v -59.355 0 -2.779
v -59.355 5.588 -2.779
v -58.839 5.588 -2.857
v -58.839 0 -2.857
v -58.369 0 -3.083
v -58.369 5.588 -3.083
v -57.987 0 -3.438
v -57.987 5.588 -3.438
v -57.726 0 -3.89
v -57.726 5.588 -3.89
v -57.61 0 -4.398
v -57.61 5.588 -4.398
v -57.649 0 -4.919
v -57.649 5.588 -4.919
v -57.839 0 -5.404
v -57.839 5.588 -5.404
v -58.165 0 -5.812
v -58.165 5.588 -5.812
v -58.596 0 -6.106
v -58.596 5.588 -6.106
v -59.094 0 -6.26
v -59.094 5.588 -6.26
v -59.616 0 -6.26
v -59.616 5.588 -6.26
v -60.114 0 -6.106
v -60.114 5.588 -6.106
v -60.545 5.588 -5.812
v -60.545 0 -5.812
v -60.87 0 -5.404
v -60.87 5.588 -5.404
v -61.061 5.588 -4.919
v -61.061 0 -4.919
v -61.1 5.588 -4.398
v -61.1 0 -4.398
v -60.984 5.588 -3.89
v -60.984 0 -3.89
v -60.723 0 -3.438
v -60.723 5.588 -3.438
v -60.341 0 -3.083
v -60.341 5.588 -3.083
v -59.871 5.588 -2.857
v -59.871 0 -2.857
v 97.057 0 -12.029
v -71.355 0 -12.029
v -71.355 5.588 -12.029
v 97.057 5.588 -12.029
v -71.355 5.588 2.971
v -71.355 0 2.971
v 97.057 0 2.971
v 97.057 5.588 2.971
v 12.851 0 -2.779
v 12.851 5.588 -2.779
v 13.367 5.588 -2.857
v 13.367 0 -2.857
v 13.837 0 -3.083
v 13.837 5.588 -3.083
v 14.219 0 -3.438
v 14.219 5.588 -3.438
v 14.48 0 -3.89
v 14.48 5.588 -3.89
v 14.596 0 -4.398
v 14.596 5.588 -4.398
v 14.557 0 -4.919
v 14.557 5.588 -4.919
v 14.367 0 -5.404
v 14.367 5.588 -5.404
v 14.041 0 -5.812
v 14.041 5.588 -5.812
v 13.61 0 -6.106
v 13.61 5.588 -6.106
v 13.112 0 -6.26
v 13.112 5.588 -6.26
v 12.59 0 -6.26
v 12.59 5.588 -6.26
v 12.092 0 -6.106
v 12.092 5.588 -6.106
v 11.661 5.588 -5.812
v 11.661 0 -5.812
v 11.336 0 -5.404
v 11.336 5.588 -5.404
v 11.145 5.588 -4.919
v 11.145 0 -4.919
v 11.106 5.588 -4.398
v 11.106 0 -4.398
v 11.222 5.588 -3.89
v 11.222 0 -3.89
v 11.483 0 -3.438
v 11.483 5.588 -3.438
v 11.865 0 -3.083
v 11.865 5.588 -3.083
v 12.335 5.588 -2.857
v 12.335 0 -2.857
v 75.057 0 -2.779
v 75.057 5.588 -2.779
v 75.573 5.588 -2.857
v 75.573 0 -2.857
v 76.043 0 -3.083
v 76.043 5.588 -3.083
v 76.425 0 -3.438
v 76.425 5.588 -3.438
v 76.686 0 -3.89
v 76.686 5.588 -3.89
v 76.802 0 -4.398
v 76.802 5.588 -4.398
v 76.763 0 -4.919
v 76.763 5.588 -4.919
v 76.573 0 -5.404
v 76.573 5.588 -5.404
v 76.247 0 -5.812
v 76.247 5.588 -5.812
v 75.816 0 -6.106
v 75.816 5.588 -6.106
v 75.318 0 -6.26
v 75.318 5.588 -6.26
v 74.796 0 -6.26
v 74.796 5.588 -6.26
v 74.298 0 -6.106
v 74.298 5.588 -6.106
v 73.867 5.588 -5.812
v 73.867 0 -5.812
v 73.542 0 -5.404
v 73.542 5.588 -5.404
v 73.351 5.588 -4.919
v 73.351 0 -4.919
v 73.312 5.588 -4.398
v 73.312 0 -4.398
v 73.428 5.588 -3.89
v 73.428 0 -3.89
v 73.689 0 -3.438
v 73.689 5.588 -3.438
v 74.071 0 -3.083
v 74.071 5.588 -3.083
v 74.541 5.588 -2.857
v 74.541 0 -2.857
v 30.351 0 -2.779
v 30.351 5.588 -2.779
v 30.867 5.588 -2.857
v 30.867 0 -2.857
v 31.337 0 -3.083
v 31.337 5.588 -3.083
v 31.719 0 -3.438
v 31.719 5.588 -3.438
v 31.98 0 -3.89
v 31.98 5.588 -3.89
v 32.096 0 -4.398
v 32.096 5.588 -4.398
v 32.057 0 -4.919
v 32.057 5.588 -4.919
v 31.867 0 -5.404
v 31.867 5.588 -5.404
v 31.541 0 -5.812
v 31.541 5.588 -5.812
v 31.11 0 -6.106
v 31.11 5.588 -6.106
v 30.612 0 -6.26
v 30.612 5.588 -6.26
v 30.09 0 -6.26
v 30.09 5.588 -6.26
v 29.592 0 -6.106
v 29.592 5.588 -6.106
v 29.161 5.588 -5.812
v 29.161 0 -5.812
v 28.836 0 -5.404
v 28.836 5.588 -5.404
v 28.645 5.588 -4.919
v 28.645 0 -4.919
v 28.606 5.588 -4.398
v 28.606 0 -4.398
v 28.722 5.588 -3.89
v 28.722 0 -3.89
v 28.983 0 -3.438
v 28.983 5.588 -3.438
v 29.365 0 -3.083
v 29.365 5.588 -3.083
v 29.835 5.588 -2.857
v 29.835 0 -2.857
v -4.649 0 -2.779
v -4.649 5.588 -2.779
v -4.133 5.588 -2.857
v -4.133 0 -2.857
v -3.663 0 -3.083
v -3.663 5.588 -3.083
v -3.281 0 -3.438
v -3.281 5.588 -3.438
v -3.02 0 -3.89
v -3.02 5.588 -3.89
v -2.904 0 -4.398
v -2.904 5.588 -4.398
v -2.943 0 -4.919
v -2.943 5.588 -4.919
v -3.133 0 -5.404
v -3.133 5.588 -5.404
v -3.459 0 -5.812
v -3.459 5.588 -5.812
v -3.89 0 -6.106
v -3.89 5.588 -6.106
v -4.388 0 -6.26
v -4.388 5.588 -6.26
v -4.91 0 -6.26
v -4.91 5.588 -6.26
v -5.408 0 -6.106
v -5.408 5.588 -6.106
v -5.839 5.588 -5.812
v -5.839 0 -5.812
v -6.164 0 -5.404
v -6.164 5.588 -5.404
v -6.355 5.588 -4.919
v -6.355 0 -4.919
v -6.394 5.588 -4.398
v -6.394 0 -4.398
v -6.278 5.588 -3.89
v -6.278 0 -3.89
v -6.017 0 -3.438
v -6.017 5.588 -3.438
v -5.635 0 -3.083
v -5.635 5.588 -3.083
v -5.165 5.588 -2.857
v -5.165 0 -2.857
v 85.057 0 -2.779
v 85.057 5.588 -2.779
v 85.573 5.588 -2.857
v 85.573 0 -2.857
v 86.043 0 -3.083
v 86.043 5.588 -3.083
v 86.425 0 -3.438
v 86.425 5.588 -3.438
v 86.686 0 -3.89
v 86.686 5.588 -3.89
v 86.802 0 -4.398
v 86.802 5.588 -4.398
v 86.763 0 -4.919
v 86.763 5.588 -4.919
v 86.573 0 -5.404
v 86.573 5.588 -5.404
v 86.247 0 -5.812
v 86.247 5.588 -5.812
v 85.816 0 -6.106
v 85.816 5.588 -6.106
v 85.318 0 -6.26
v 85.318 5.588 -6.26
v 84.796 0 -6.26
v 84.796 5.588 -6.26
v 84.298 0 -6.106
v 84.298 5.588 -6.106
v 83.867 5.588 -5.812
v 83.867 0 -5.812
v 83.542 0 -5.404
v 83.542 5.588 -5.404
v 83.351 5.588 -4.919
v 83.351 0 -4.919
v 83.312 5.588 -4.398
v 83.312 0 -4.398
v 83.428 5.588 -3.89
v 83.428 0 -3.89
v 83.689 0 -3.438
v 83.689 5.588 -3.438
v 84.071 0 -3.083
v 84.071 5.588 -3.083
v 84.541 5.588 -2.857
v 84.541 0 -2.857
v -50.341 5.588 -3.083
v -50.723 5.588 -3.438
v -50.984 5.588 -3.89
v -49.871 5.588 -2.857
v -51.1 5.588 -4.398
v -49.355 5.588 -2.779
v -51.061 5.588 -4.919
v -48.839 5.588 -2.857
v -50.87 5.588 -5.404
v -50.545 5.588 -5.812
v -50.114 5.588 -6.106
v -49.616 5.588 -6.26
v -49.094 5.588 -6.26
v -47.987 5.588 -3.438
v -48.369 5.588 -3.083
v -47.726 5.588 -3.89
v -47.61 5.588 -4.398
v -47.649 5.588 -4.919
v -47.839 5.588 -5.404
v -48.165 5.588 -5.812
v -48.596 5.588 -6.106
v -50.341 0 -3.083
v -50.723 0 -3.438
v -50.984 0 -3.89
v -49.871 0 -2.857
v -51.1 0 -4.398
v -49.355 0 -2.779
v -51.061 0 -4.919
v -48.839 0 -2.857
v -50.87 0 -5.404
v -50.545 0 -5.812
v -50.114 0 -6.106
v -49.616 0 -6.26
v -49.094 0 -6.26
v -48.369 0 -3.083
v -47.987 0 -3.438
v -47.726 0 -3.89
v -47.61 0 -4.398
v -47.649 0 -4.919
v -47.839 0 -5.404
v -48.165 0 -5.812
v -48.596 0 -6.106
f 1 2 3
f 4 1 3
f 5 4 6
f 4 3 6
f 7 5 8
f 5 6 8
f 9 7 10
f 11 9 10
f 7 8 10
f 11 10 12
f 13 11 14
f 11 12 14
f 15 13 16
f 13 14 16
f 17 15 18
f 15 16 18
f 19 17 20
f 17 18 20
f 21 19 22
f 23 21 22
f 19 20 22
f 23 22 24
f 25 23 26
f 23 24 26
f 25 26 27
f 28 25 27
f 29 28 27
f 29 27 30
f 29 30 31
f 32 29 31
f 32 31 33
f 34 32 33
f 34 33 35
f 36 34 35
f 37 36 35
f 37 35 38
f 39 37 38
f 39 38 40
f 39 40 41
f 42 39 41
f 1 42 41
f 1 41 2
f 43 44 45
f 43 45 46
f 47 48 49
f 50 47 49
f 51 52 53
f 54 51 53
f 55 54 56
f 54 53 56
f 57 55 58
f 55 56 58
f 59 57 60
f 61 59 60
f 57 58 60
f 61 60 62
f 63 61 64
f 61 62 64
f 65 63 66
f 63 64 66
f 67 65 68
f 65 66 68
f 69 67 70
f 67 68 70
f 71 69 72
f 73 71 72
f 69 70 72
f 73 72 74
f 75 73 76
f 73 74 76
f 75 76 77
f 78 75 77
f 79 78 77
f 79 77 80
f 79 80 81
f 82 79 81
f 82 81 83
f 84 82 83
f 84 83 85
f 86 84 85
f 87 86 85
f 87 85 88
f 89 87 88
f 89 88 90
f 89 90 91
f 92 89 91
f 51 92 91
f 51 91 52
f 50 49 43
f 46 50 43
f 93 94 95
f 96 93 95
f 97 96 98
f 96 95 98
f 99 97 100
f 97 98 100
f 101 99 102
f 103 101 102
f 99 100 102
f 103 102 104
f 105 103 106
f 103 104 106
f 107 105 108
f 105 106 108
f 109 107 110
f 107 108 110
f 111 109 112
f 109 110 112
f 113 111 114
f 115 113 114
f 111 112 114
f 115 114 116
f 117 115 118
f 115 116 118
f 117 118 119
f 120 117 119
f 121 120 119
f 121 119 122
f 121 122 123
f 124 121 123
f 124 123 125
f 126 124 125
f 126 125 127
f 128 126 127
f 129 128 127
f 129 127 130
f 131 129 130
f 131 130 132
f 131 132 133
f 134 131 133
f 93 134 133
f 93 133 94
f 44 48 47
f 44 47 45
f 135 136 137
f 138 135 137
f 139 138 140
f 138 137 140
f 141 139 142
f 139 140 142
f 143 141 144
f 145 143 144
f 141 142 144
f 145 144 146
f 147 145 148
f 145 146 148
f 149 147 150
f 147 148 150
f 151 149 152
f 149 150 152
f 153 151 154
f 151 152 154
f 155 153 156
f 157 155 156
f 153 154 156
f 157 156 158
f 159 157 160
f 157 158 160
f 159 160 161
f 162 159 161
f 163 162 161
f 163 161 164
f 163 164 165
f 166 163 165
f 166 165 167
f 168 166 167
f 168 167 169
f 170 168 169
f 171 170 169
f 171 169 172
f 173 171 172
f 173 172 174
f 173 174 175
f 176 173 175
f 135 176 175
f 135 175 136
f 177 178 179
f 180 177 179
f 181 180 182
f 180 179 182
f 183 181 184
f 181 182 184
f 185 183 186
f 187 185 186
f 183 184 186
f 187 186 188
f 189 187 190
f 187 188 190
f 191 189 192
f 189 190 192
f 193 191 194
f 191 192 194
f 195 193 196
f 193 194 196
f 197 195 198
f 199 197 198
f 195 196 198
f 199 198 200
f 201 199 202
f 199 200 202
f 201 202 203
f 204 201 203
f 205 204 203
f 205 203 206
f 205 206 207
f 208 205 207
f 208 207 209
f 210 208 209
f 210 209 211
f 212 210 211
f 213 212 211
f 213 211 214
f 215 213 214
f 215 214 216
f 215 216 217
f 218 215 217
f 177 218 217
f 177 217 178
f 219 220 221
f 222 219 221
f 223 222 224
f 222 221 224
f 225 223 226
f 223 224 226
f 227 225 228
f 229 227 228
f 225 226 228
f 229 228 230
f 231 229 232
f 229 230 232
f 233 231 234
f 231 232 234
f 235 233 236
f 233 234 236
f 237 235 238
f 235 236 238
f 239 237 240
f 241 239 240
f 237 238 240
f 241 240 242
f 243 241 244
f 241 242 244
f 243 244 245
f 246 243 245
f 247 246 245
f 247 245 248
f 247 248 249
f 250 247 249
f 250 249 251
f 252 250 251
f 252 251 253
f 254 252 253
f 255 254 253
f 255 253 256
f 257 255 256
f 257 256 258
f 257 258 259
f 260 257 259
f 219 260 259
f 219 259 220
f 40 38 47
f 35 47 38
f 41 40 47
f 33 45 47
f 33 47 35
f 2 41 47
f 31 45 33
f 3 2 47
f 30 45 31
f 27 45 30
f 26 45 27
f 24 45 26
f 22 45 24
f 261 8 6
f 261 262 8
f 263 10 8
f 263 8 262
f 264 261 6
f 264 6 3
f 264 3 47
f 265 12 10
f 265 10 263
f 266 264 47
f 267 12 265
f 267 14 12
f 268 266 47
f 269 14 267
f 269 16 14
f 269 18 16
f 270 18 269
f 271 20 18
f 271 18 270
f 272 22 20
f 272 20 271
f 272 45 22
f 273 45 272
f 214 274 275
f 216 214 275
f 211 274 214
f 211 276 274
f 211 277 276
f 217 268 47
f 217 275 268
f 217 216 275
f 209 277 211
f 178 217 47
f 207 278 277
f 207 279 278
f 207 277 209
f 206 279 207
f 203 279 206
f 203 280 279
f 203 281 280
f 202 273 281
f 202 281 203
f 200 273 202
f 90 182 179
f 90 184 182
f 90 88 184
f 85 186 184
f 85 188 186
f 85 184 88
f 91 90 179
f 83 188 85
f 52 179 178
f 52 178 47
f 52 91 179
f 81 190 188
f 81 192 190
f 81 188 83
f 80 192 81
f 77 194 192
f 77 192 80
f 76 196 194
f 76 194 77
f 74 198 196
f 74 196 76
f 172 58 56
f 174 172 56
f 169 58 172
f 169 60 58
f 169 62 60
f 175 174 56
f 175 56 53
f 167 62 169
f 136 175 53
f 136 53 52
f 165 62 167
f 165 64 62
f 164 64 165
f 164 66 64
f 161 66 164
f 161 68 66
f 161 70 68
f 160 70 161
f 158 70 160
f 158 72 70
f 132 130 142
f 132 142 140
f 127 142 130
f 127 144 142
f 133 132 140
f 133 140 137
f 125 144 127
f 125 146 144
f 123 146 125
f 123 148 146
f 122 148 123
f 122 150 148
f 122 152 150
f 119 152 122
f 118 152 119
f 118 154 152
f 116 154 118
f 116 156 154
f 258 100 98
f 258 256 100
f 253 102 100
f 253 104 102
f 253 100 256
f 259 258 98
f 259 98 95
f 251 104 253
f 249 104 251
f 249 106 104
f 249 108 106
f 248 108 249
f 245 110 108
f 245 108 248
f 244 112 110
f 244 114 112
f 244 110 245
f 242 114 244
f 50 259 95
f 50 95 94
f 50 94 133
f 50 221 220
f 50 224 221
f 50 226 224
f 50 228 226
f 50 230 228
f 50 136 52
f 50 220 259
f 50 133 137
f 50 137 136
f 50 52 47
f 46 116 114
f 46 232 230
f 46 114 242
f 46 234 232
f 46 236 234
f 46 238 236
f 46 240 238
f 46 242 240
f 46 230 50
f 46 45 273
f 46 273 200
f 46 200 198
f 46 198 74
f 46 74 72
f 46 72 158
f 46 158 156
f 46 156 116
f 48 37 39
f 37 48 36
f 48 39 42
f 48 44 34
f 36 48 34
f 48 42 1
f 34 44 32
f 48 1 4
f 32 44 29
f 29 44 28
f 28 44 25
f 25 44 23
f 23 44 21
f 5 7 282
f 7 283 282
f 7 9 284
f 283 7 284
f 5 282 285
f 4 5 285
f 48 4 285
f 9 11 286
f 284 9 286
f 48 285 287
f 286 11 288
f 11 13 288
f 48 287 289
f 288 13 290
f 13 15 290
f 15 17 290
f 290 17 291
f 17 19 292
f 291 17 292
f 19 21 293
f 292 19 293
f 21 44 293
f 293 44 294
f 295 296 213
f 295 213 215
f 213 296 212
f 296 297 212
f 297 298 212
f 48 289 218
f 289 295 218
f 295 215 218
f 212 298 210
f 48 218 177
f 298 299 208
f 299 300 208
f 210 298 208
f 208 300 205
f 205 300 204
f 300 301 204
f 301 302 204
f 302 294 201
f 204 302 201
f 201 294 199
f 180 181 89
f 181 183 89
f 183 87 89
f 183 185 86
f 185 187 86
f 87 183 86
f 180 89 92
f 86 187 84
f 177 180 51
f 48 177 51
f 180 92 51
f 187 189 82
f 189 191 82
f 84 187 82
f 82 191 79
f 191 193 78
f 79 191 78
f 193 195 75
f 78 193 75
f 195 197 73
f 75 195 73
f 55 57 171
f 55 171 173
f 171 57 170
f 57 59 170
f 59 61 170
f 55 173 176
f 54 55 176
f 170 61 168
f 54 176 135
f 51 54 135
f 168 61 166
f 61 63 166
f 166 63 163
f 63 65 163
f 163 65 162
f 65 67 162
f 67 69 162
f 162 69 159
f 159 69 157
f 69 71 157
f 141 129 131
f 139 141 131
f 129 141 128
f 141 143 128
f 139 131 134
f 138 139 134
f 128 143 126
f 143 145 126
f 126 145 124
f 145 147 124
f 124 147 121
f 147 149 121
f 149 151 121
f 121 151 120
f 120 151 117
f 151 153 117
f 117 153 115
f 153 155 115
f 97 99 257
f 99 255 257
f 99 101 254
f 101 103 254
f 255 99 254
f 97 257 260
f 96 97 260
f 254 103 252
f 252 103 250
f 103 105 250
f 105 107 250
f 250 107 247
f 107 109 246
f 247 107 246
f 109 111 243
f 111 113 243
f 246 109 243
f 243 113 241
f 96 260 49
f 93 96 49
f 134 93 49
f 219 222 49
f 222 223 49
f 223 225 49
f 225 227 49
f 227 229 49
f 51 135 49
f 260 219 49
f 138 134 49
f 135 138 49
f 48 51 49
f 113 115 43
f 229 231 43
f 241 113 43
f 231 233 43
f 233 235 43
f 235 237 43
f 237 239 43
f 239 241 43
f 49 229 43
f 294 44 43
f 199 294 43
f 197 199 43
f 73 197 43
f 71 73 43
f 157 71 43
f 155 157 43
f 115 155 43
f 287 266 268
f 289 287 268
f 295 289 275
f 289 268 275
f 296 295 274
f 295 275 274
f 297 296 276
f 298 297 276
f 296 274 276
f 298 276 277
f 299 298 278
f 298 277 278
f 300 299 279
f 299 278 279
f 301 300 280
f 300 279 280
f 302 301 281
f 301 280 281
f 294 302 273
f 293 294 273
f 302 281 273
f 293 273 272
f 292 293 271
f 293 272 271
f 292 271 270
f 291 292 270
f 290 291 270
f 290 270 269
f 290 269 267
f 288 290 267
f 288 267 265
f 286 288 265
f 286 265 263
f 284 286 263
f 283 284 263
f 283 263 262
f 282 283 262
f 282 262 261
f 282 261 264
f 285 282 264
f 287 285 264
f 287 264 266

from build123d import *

# Parameters (mm, degrees)
SKETCH1_W           = 168.412
SKETCH1_H           = 15
BOSS_EXTRUDE1_DEPTH = 5.588
SKETCH2_R           = 1.75
CUT_EXTRUDE1_DEPTH  = 98.959199068
SKETCH3_R           = 1.75
CUT_EXTRUDE2_DEPTH  = 98.959199068


with BuildPart() as part:
    # Sketch1 → Boss-Extrude1 (new body)
    with BuildSketch(Plane(origin=(0, 0, 0), x_dir=(1, 0, 0), z_dir=(0, 1, 0))):
        with Locations((12.851084959, 4.52918108)):
            Rectangle(SKETCH1_W, SKETCH1_H)
    extrude(amount=BOSS_EXTRUDE1_DEPTH)

    # Sketch2 → Cut-Extrude1 (cut, through all)
    with BuildSketch(Plane(origin=(0, 5.588, 0), x_dir=(1, 0, 0), z_dir=(0, 1, 0))):
        with Locations(Location((-59.354915041, 4.52918108, 0), (0, 0, 270))):
            Circle(SKETCH2_R)
        with Locations(Location((-49.354915041, 4.52918108, 0), (0, 0, 270))):
            Circle(SKETCH2_R)
        with Locations(Location((75.057084959, 4.52918108, 0), (0, 0, 270))):
            Circle(SKETCH2_R)
        with Locations(Location((85.057084959, 4.52918108, 0), (0, 0, 270))):
            Circle(SKETCH2_R)
    extrude(amount=-CUT_EXTRUDE1_DEPTH, mode=Mode.SUBTRACT)

    # Sketch3 → Cut-Extrude2 (cut, through all)
    with BuildSketch(Plane(origin=(0, 5.588, 0), x_dir=(1, 0, 0), z_dir=(0, 1, 0))):
        with Locations(Location((-4.648915041, 4.52918108, 0), (0, 0, 270))):
            Circle(SKETCH3_R)
        with Locations(Location((30.351084959, 4.52918108, 0), (0, 0, 270))):
            Circle(SKETCH3_R)
        with Locations(Location((12.851084959, 4.52918108, 0), (0, 0, 270))):
            Circle(SKETCH3_R)
    extrude(amount=-CUT_EXTRUDE2_DEPTH, mode=Mode.SUBTRACT)


solid = part.part
